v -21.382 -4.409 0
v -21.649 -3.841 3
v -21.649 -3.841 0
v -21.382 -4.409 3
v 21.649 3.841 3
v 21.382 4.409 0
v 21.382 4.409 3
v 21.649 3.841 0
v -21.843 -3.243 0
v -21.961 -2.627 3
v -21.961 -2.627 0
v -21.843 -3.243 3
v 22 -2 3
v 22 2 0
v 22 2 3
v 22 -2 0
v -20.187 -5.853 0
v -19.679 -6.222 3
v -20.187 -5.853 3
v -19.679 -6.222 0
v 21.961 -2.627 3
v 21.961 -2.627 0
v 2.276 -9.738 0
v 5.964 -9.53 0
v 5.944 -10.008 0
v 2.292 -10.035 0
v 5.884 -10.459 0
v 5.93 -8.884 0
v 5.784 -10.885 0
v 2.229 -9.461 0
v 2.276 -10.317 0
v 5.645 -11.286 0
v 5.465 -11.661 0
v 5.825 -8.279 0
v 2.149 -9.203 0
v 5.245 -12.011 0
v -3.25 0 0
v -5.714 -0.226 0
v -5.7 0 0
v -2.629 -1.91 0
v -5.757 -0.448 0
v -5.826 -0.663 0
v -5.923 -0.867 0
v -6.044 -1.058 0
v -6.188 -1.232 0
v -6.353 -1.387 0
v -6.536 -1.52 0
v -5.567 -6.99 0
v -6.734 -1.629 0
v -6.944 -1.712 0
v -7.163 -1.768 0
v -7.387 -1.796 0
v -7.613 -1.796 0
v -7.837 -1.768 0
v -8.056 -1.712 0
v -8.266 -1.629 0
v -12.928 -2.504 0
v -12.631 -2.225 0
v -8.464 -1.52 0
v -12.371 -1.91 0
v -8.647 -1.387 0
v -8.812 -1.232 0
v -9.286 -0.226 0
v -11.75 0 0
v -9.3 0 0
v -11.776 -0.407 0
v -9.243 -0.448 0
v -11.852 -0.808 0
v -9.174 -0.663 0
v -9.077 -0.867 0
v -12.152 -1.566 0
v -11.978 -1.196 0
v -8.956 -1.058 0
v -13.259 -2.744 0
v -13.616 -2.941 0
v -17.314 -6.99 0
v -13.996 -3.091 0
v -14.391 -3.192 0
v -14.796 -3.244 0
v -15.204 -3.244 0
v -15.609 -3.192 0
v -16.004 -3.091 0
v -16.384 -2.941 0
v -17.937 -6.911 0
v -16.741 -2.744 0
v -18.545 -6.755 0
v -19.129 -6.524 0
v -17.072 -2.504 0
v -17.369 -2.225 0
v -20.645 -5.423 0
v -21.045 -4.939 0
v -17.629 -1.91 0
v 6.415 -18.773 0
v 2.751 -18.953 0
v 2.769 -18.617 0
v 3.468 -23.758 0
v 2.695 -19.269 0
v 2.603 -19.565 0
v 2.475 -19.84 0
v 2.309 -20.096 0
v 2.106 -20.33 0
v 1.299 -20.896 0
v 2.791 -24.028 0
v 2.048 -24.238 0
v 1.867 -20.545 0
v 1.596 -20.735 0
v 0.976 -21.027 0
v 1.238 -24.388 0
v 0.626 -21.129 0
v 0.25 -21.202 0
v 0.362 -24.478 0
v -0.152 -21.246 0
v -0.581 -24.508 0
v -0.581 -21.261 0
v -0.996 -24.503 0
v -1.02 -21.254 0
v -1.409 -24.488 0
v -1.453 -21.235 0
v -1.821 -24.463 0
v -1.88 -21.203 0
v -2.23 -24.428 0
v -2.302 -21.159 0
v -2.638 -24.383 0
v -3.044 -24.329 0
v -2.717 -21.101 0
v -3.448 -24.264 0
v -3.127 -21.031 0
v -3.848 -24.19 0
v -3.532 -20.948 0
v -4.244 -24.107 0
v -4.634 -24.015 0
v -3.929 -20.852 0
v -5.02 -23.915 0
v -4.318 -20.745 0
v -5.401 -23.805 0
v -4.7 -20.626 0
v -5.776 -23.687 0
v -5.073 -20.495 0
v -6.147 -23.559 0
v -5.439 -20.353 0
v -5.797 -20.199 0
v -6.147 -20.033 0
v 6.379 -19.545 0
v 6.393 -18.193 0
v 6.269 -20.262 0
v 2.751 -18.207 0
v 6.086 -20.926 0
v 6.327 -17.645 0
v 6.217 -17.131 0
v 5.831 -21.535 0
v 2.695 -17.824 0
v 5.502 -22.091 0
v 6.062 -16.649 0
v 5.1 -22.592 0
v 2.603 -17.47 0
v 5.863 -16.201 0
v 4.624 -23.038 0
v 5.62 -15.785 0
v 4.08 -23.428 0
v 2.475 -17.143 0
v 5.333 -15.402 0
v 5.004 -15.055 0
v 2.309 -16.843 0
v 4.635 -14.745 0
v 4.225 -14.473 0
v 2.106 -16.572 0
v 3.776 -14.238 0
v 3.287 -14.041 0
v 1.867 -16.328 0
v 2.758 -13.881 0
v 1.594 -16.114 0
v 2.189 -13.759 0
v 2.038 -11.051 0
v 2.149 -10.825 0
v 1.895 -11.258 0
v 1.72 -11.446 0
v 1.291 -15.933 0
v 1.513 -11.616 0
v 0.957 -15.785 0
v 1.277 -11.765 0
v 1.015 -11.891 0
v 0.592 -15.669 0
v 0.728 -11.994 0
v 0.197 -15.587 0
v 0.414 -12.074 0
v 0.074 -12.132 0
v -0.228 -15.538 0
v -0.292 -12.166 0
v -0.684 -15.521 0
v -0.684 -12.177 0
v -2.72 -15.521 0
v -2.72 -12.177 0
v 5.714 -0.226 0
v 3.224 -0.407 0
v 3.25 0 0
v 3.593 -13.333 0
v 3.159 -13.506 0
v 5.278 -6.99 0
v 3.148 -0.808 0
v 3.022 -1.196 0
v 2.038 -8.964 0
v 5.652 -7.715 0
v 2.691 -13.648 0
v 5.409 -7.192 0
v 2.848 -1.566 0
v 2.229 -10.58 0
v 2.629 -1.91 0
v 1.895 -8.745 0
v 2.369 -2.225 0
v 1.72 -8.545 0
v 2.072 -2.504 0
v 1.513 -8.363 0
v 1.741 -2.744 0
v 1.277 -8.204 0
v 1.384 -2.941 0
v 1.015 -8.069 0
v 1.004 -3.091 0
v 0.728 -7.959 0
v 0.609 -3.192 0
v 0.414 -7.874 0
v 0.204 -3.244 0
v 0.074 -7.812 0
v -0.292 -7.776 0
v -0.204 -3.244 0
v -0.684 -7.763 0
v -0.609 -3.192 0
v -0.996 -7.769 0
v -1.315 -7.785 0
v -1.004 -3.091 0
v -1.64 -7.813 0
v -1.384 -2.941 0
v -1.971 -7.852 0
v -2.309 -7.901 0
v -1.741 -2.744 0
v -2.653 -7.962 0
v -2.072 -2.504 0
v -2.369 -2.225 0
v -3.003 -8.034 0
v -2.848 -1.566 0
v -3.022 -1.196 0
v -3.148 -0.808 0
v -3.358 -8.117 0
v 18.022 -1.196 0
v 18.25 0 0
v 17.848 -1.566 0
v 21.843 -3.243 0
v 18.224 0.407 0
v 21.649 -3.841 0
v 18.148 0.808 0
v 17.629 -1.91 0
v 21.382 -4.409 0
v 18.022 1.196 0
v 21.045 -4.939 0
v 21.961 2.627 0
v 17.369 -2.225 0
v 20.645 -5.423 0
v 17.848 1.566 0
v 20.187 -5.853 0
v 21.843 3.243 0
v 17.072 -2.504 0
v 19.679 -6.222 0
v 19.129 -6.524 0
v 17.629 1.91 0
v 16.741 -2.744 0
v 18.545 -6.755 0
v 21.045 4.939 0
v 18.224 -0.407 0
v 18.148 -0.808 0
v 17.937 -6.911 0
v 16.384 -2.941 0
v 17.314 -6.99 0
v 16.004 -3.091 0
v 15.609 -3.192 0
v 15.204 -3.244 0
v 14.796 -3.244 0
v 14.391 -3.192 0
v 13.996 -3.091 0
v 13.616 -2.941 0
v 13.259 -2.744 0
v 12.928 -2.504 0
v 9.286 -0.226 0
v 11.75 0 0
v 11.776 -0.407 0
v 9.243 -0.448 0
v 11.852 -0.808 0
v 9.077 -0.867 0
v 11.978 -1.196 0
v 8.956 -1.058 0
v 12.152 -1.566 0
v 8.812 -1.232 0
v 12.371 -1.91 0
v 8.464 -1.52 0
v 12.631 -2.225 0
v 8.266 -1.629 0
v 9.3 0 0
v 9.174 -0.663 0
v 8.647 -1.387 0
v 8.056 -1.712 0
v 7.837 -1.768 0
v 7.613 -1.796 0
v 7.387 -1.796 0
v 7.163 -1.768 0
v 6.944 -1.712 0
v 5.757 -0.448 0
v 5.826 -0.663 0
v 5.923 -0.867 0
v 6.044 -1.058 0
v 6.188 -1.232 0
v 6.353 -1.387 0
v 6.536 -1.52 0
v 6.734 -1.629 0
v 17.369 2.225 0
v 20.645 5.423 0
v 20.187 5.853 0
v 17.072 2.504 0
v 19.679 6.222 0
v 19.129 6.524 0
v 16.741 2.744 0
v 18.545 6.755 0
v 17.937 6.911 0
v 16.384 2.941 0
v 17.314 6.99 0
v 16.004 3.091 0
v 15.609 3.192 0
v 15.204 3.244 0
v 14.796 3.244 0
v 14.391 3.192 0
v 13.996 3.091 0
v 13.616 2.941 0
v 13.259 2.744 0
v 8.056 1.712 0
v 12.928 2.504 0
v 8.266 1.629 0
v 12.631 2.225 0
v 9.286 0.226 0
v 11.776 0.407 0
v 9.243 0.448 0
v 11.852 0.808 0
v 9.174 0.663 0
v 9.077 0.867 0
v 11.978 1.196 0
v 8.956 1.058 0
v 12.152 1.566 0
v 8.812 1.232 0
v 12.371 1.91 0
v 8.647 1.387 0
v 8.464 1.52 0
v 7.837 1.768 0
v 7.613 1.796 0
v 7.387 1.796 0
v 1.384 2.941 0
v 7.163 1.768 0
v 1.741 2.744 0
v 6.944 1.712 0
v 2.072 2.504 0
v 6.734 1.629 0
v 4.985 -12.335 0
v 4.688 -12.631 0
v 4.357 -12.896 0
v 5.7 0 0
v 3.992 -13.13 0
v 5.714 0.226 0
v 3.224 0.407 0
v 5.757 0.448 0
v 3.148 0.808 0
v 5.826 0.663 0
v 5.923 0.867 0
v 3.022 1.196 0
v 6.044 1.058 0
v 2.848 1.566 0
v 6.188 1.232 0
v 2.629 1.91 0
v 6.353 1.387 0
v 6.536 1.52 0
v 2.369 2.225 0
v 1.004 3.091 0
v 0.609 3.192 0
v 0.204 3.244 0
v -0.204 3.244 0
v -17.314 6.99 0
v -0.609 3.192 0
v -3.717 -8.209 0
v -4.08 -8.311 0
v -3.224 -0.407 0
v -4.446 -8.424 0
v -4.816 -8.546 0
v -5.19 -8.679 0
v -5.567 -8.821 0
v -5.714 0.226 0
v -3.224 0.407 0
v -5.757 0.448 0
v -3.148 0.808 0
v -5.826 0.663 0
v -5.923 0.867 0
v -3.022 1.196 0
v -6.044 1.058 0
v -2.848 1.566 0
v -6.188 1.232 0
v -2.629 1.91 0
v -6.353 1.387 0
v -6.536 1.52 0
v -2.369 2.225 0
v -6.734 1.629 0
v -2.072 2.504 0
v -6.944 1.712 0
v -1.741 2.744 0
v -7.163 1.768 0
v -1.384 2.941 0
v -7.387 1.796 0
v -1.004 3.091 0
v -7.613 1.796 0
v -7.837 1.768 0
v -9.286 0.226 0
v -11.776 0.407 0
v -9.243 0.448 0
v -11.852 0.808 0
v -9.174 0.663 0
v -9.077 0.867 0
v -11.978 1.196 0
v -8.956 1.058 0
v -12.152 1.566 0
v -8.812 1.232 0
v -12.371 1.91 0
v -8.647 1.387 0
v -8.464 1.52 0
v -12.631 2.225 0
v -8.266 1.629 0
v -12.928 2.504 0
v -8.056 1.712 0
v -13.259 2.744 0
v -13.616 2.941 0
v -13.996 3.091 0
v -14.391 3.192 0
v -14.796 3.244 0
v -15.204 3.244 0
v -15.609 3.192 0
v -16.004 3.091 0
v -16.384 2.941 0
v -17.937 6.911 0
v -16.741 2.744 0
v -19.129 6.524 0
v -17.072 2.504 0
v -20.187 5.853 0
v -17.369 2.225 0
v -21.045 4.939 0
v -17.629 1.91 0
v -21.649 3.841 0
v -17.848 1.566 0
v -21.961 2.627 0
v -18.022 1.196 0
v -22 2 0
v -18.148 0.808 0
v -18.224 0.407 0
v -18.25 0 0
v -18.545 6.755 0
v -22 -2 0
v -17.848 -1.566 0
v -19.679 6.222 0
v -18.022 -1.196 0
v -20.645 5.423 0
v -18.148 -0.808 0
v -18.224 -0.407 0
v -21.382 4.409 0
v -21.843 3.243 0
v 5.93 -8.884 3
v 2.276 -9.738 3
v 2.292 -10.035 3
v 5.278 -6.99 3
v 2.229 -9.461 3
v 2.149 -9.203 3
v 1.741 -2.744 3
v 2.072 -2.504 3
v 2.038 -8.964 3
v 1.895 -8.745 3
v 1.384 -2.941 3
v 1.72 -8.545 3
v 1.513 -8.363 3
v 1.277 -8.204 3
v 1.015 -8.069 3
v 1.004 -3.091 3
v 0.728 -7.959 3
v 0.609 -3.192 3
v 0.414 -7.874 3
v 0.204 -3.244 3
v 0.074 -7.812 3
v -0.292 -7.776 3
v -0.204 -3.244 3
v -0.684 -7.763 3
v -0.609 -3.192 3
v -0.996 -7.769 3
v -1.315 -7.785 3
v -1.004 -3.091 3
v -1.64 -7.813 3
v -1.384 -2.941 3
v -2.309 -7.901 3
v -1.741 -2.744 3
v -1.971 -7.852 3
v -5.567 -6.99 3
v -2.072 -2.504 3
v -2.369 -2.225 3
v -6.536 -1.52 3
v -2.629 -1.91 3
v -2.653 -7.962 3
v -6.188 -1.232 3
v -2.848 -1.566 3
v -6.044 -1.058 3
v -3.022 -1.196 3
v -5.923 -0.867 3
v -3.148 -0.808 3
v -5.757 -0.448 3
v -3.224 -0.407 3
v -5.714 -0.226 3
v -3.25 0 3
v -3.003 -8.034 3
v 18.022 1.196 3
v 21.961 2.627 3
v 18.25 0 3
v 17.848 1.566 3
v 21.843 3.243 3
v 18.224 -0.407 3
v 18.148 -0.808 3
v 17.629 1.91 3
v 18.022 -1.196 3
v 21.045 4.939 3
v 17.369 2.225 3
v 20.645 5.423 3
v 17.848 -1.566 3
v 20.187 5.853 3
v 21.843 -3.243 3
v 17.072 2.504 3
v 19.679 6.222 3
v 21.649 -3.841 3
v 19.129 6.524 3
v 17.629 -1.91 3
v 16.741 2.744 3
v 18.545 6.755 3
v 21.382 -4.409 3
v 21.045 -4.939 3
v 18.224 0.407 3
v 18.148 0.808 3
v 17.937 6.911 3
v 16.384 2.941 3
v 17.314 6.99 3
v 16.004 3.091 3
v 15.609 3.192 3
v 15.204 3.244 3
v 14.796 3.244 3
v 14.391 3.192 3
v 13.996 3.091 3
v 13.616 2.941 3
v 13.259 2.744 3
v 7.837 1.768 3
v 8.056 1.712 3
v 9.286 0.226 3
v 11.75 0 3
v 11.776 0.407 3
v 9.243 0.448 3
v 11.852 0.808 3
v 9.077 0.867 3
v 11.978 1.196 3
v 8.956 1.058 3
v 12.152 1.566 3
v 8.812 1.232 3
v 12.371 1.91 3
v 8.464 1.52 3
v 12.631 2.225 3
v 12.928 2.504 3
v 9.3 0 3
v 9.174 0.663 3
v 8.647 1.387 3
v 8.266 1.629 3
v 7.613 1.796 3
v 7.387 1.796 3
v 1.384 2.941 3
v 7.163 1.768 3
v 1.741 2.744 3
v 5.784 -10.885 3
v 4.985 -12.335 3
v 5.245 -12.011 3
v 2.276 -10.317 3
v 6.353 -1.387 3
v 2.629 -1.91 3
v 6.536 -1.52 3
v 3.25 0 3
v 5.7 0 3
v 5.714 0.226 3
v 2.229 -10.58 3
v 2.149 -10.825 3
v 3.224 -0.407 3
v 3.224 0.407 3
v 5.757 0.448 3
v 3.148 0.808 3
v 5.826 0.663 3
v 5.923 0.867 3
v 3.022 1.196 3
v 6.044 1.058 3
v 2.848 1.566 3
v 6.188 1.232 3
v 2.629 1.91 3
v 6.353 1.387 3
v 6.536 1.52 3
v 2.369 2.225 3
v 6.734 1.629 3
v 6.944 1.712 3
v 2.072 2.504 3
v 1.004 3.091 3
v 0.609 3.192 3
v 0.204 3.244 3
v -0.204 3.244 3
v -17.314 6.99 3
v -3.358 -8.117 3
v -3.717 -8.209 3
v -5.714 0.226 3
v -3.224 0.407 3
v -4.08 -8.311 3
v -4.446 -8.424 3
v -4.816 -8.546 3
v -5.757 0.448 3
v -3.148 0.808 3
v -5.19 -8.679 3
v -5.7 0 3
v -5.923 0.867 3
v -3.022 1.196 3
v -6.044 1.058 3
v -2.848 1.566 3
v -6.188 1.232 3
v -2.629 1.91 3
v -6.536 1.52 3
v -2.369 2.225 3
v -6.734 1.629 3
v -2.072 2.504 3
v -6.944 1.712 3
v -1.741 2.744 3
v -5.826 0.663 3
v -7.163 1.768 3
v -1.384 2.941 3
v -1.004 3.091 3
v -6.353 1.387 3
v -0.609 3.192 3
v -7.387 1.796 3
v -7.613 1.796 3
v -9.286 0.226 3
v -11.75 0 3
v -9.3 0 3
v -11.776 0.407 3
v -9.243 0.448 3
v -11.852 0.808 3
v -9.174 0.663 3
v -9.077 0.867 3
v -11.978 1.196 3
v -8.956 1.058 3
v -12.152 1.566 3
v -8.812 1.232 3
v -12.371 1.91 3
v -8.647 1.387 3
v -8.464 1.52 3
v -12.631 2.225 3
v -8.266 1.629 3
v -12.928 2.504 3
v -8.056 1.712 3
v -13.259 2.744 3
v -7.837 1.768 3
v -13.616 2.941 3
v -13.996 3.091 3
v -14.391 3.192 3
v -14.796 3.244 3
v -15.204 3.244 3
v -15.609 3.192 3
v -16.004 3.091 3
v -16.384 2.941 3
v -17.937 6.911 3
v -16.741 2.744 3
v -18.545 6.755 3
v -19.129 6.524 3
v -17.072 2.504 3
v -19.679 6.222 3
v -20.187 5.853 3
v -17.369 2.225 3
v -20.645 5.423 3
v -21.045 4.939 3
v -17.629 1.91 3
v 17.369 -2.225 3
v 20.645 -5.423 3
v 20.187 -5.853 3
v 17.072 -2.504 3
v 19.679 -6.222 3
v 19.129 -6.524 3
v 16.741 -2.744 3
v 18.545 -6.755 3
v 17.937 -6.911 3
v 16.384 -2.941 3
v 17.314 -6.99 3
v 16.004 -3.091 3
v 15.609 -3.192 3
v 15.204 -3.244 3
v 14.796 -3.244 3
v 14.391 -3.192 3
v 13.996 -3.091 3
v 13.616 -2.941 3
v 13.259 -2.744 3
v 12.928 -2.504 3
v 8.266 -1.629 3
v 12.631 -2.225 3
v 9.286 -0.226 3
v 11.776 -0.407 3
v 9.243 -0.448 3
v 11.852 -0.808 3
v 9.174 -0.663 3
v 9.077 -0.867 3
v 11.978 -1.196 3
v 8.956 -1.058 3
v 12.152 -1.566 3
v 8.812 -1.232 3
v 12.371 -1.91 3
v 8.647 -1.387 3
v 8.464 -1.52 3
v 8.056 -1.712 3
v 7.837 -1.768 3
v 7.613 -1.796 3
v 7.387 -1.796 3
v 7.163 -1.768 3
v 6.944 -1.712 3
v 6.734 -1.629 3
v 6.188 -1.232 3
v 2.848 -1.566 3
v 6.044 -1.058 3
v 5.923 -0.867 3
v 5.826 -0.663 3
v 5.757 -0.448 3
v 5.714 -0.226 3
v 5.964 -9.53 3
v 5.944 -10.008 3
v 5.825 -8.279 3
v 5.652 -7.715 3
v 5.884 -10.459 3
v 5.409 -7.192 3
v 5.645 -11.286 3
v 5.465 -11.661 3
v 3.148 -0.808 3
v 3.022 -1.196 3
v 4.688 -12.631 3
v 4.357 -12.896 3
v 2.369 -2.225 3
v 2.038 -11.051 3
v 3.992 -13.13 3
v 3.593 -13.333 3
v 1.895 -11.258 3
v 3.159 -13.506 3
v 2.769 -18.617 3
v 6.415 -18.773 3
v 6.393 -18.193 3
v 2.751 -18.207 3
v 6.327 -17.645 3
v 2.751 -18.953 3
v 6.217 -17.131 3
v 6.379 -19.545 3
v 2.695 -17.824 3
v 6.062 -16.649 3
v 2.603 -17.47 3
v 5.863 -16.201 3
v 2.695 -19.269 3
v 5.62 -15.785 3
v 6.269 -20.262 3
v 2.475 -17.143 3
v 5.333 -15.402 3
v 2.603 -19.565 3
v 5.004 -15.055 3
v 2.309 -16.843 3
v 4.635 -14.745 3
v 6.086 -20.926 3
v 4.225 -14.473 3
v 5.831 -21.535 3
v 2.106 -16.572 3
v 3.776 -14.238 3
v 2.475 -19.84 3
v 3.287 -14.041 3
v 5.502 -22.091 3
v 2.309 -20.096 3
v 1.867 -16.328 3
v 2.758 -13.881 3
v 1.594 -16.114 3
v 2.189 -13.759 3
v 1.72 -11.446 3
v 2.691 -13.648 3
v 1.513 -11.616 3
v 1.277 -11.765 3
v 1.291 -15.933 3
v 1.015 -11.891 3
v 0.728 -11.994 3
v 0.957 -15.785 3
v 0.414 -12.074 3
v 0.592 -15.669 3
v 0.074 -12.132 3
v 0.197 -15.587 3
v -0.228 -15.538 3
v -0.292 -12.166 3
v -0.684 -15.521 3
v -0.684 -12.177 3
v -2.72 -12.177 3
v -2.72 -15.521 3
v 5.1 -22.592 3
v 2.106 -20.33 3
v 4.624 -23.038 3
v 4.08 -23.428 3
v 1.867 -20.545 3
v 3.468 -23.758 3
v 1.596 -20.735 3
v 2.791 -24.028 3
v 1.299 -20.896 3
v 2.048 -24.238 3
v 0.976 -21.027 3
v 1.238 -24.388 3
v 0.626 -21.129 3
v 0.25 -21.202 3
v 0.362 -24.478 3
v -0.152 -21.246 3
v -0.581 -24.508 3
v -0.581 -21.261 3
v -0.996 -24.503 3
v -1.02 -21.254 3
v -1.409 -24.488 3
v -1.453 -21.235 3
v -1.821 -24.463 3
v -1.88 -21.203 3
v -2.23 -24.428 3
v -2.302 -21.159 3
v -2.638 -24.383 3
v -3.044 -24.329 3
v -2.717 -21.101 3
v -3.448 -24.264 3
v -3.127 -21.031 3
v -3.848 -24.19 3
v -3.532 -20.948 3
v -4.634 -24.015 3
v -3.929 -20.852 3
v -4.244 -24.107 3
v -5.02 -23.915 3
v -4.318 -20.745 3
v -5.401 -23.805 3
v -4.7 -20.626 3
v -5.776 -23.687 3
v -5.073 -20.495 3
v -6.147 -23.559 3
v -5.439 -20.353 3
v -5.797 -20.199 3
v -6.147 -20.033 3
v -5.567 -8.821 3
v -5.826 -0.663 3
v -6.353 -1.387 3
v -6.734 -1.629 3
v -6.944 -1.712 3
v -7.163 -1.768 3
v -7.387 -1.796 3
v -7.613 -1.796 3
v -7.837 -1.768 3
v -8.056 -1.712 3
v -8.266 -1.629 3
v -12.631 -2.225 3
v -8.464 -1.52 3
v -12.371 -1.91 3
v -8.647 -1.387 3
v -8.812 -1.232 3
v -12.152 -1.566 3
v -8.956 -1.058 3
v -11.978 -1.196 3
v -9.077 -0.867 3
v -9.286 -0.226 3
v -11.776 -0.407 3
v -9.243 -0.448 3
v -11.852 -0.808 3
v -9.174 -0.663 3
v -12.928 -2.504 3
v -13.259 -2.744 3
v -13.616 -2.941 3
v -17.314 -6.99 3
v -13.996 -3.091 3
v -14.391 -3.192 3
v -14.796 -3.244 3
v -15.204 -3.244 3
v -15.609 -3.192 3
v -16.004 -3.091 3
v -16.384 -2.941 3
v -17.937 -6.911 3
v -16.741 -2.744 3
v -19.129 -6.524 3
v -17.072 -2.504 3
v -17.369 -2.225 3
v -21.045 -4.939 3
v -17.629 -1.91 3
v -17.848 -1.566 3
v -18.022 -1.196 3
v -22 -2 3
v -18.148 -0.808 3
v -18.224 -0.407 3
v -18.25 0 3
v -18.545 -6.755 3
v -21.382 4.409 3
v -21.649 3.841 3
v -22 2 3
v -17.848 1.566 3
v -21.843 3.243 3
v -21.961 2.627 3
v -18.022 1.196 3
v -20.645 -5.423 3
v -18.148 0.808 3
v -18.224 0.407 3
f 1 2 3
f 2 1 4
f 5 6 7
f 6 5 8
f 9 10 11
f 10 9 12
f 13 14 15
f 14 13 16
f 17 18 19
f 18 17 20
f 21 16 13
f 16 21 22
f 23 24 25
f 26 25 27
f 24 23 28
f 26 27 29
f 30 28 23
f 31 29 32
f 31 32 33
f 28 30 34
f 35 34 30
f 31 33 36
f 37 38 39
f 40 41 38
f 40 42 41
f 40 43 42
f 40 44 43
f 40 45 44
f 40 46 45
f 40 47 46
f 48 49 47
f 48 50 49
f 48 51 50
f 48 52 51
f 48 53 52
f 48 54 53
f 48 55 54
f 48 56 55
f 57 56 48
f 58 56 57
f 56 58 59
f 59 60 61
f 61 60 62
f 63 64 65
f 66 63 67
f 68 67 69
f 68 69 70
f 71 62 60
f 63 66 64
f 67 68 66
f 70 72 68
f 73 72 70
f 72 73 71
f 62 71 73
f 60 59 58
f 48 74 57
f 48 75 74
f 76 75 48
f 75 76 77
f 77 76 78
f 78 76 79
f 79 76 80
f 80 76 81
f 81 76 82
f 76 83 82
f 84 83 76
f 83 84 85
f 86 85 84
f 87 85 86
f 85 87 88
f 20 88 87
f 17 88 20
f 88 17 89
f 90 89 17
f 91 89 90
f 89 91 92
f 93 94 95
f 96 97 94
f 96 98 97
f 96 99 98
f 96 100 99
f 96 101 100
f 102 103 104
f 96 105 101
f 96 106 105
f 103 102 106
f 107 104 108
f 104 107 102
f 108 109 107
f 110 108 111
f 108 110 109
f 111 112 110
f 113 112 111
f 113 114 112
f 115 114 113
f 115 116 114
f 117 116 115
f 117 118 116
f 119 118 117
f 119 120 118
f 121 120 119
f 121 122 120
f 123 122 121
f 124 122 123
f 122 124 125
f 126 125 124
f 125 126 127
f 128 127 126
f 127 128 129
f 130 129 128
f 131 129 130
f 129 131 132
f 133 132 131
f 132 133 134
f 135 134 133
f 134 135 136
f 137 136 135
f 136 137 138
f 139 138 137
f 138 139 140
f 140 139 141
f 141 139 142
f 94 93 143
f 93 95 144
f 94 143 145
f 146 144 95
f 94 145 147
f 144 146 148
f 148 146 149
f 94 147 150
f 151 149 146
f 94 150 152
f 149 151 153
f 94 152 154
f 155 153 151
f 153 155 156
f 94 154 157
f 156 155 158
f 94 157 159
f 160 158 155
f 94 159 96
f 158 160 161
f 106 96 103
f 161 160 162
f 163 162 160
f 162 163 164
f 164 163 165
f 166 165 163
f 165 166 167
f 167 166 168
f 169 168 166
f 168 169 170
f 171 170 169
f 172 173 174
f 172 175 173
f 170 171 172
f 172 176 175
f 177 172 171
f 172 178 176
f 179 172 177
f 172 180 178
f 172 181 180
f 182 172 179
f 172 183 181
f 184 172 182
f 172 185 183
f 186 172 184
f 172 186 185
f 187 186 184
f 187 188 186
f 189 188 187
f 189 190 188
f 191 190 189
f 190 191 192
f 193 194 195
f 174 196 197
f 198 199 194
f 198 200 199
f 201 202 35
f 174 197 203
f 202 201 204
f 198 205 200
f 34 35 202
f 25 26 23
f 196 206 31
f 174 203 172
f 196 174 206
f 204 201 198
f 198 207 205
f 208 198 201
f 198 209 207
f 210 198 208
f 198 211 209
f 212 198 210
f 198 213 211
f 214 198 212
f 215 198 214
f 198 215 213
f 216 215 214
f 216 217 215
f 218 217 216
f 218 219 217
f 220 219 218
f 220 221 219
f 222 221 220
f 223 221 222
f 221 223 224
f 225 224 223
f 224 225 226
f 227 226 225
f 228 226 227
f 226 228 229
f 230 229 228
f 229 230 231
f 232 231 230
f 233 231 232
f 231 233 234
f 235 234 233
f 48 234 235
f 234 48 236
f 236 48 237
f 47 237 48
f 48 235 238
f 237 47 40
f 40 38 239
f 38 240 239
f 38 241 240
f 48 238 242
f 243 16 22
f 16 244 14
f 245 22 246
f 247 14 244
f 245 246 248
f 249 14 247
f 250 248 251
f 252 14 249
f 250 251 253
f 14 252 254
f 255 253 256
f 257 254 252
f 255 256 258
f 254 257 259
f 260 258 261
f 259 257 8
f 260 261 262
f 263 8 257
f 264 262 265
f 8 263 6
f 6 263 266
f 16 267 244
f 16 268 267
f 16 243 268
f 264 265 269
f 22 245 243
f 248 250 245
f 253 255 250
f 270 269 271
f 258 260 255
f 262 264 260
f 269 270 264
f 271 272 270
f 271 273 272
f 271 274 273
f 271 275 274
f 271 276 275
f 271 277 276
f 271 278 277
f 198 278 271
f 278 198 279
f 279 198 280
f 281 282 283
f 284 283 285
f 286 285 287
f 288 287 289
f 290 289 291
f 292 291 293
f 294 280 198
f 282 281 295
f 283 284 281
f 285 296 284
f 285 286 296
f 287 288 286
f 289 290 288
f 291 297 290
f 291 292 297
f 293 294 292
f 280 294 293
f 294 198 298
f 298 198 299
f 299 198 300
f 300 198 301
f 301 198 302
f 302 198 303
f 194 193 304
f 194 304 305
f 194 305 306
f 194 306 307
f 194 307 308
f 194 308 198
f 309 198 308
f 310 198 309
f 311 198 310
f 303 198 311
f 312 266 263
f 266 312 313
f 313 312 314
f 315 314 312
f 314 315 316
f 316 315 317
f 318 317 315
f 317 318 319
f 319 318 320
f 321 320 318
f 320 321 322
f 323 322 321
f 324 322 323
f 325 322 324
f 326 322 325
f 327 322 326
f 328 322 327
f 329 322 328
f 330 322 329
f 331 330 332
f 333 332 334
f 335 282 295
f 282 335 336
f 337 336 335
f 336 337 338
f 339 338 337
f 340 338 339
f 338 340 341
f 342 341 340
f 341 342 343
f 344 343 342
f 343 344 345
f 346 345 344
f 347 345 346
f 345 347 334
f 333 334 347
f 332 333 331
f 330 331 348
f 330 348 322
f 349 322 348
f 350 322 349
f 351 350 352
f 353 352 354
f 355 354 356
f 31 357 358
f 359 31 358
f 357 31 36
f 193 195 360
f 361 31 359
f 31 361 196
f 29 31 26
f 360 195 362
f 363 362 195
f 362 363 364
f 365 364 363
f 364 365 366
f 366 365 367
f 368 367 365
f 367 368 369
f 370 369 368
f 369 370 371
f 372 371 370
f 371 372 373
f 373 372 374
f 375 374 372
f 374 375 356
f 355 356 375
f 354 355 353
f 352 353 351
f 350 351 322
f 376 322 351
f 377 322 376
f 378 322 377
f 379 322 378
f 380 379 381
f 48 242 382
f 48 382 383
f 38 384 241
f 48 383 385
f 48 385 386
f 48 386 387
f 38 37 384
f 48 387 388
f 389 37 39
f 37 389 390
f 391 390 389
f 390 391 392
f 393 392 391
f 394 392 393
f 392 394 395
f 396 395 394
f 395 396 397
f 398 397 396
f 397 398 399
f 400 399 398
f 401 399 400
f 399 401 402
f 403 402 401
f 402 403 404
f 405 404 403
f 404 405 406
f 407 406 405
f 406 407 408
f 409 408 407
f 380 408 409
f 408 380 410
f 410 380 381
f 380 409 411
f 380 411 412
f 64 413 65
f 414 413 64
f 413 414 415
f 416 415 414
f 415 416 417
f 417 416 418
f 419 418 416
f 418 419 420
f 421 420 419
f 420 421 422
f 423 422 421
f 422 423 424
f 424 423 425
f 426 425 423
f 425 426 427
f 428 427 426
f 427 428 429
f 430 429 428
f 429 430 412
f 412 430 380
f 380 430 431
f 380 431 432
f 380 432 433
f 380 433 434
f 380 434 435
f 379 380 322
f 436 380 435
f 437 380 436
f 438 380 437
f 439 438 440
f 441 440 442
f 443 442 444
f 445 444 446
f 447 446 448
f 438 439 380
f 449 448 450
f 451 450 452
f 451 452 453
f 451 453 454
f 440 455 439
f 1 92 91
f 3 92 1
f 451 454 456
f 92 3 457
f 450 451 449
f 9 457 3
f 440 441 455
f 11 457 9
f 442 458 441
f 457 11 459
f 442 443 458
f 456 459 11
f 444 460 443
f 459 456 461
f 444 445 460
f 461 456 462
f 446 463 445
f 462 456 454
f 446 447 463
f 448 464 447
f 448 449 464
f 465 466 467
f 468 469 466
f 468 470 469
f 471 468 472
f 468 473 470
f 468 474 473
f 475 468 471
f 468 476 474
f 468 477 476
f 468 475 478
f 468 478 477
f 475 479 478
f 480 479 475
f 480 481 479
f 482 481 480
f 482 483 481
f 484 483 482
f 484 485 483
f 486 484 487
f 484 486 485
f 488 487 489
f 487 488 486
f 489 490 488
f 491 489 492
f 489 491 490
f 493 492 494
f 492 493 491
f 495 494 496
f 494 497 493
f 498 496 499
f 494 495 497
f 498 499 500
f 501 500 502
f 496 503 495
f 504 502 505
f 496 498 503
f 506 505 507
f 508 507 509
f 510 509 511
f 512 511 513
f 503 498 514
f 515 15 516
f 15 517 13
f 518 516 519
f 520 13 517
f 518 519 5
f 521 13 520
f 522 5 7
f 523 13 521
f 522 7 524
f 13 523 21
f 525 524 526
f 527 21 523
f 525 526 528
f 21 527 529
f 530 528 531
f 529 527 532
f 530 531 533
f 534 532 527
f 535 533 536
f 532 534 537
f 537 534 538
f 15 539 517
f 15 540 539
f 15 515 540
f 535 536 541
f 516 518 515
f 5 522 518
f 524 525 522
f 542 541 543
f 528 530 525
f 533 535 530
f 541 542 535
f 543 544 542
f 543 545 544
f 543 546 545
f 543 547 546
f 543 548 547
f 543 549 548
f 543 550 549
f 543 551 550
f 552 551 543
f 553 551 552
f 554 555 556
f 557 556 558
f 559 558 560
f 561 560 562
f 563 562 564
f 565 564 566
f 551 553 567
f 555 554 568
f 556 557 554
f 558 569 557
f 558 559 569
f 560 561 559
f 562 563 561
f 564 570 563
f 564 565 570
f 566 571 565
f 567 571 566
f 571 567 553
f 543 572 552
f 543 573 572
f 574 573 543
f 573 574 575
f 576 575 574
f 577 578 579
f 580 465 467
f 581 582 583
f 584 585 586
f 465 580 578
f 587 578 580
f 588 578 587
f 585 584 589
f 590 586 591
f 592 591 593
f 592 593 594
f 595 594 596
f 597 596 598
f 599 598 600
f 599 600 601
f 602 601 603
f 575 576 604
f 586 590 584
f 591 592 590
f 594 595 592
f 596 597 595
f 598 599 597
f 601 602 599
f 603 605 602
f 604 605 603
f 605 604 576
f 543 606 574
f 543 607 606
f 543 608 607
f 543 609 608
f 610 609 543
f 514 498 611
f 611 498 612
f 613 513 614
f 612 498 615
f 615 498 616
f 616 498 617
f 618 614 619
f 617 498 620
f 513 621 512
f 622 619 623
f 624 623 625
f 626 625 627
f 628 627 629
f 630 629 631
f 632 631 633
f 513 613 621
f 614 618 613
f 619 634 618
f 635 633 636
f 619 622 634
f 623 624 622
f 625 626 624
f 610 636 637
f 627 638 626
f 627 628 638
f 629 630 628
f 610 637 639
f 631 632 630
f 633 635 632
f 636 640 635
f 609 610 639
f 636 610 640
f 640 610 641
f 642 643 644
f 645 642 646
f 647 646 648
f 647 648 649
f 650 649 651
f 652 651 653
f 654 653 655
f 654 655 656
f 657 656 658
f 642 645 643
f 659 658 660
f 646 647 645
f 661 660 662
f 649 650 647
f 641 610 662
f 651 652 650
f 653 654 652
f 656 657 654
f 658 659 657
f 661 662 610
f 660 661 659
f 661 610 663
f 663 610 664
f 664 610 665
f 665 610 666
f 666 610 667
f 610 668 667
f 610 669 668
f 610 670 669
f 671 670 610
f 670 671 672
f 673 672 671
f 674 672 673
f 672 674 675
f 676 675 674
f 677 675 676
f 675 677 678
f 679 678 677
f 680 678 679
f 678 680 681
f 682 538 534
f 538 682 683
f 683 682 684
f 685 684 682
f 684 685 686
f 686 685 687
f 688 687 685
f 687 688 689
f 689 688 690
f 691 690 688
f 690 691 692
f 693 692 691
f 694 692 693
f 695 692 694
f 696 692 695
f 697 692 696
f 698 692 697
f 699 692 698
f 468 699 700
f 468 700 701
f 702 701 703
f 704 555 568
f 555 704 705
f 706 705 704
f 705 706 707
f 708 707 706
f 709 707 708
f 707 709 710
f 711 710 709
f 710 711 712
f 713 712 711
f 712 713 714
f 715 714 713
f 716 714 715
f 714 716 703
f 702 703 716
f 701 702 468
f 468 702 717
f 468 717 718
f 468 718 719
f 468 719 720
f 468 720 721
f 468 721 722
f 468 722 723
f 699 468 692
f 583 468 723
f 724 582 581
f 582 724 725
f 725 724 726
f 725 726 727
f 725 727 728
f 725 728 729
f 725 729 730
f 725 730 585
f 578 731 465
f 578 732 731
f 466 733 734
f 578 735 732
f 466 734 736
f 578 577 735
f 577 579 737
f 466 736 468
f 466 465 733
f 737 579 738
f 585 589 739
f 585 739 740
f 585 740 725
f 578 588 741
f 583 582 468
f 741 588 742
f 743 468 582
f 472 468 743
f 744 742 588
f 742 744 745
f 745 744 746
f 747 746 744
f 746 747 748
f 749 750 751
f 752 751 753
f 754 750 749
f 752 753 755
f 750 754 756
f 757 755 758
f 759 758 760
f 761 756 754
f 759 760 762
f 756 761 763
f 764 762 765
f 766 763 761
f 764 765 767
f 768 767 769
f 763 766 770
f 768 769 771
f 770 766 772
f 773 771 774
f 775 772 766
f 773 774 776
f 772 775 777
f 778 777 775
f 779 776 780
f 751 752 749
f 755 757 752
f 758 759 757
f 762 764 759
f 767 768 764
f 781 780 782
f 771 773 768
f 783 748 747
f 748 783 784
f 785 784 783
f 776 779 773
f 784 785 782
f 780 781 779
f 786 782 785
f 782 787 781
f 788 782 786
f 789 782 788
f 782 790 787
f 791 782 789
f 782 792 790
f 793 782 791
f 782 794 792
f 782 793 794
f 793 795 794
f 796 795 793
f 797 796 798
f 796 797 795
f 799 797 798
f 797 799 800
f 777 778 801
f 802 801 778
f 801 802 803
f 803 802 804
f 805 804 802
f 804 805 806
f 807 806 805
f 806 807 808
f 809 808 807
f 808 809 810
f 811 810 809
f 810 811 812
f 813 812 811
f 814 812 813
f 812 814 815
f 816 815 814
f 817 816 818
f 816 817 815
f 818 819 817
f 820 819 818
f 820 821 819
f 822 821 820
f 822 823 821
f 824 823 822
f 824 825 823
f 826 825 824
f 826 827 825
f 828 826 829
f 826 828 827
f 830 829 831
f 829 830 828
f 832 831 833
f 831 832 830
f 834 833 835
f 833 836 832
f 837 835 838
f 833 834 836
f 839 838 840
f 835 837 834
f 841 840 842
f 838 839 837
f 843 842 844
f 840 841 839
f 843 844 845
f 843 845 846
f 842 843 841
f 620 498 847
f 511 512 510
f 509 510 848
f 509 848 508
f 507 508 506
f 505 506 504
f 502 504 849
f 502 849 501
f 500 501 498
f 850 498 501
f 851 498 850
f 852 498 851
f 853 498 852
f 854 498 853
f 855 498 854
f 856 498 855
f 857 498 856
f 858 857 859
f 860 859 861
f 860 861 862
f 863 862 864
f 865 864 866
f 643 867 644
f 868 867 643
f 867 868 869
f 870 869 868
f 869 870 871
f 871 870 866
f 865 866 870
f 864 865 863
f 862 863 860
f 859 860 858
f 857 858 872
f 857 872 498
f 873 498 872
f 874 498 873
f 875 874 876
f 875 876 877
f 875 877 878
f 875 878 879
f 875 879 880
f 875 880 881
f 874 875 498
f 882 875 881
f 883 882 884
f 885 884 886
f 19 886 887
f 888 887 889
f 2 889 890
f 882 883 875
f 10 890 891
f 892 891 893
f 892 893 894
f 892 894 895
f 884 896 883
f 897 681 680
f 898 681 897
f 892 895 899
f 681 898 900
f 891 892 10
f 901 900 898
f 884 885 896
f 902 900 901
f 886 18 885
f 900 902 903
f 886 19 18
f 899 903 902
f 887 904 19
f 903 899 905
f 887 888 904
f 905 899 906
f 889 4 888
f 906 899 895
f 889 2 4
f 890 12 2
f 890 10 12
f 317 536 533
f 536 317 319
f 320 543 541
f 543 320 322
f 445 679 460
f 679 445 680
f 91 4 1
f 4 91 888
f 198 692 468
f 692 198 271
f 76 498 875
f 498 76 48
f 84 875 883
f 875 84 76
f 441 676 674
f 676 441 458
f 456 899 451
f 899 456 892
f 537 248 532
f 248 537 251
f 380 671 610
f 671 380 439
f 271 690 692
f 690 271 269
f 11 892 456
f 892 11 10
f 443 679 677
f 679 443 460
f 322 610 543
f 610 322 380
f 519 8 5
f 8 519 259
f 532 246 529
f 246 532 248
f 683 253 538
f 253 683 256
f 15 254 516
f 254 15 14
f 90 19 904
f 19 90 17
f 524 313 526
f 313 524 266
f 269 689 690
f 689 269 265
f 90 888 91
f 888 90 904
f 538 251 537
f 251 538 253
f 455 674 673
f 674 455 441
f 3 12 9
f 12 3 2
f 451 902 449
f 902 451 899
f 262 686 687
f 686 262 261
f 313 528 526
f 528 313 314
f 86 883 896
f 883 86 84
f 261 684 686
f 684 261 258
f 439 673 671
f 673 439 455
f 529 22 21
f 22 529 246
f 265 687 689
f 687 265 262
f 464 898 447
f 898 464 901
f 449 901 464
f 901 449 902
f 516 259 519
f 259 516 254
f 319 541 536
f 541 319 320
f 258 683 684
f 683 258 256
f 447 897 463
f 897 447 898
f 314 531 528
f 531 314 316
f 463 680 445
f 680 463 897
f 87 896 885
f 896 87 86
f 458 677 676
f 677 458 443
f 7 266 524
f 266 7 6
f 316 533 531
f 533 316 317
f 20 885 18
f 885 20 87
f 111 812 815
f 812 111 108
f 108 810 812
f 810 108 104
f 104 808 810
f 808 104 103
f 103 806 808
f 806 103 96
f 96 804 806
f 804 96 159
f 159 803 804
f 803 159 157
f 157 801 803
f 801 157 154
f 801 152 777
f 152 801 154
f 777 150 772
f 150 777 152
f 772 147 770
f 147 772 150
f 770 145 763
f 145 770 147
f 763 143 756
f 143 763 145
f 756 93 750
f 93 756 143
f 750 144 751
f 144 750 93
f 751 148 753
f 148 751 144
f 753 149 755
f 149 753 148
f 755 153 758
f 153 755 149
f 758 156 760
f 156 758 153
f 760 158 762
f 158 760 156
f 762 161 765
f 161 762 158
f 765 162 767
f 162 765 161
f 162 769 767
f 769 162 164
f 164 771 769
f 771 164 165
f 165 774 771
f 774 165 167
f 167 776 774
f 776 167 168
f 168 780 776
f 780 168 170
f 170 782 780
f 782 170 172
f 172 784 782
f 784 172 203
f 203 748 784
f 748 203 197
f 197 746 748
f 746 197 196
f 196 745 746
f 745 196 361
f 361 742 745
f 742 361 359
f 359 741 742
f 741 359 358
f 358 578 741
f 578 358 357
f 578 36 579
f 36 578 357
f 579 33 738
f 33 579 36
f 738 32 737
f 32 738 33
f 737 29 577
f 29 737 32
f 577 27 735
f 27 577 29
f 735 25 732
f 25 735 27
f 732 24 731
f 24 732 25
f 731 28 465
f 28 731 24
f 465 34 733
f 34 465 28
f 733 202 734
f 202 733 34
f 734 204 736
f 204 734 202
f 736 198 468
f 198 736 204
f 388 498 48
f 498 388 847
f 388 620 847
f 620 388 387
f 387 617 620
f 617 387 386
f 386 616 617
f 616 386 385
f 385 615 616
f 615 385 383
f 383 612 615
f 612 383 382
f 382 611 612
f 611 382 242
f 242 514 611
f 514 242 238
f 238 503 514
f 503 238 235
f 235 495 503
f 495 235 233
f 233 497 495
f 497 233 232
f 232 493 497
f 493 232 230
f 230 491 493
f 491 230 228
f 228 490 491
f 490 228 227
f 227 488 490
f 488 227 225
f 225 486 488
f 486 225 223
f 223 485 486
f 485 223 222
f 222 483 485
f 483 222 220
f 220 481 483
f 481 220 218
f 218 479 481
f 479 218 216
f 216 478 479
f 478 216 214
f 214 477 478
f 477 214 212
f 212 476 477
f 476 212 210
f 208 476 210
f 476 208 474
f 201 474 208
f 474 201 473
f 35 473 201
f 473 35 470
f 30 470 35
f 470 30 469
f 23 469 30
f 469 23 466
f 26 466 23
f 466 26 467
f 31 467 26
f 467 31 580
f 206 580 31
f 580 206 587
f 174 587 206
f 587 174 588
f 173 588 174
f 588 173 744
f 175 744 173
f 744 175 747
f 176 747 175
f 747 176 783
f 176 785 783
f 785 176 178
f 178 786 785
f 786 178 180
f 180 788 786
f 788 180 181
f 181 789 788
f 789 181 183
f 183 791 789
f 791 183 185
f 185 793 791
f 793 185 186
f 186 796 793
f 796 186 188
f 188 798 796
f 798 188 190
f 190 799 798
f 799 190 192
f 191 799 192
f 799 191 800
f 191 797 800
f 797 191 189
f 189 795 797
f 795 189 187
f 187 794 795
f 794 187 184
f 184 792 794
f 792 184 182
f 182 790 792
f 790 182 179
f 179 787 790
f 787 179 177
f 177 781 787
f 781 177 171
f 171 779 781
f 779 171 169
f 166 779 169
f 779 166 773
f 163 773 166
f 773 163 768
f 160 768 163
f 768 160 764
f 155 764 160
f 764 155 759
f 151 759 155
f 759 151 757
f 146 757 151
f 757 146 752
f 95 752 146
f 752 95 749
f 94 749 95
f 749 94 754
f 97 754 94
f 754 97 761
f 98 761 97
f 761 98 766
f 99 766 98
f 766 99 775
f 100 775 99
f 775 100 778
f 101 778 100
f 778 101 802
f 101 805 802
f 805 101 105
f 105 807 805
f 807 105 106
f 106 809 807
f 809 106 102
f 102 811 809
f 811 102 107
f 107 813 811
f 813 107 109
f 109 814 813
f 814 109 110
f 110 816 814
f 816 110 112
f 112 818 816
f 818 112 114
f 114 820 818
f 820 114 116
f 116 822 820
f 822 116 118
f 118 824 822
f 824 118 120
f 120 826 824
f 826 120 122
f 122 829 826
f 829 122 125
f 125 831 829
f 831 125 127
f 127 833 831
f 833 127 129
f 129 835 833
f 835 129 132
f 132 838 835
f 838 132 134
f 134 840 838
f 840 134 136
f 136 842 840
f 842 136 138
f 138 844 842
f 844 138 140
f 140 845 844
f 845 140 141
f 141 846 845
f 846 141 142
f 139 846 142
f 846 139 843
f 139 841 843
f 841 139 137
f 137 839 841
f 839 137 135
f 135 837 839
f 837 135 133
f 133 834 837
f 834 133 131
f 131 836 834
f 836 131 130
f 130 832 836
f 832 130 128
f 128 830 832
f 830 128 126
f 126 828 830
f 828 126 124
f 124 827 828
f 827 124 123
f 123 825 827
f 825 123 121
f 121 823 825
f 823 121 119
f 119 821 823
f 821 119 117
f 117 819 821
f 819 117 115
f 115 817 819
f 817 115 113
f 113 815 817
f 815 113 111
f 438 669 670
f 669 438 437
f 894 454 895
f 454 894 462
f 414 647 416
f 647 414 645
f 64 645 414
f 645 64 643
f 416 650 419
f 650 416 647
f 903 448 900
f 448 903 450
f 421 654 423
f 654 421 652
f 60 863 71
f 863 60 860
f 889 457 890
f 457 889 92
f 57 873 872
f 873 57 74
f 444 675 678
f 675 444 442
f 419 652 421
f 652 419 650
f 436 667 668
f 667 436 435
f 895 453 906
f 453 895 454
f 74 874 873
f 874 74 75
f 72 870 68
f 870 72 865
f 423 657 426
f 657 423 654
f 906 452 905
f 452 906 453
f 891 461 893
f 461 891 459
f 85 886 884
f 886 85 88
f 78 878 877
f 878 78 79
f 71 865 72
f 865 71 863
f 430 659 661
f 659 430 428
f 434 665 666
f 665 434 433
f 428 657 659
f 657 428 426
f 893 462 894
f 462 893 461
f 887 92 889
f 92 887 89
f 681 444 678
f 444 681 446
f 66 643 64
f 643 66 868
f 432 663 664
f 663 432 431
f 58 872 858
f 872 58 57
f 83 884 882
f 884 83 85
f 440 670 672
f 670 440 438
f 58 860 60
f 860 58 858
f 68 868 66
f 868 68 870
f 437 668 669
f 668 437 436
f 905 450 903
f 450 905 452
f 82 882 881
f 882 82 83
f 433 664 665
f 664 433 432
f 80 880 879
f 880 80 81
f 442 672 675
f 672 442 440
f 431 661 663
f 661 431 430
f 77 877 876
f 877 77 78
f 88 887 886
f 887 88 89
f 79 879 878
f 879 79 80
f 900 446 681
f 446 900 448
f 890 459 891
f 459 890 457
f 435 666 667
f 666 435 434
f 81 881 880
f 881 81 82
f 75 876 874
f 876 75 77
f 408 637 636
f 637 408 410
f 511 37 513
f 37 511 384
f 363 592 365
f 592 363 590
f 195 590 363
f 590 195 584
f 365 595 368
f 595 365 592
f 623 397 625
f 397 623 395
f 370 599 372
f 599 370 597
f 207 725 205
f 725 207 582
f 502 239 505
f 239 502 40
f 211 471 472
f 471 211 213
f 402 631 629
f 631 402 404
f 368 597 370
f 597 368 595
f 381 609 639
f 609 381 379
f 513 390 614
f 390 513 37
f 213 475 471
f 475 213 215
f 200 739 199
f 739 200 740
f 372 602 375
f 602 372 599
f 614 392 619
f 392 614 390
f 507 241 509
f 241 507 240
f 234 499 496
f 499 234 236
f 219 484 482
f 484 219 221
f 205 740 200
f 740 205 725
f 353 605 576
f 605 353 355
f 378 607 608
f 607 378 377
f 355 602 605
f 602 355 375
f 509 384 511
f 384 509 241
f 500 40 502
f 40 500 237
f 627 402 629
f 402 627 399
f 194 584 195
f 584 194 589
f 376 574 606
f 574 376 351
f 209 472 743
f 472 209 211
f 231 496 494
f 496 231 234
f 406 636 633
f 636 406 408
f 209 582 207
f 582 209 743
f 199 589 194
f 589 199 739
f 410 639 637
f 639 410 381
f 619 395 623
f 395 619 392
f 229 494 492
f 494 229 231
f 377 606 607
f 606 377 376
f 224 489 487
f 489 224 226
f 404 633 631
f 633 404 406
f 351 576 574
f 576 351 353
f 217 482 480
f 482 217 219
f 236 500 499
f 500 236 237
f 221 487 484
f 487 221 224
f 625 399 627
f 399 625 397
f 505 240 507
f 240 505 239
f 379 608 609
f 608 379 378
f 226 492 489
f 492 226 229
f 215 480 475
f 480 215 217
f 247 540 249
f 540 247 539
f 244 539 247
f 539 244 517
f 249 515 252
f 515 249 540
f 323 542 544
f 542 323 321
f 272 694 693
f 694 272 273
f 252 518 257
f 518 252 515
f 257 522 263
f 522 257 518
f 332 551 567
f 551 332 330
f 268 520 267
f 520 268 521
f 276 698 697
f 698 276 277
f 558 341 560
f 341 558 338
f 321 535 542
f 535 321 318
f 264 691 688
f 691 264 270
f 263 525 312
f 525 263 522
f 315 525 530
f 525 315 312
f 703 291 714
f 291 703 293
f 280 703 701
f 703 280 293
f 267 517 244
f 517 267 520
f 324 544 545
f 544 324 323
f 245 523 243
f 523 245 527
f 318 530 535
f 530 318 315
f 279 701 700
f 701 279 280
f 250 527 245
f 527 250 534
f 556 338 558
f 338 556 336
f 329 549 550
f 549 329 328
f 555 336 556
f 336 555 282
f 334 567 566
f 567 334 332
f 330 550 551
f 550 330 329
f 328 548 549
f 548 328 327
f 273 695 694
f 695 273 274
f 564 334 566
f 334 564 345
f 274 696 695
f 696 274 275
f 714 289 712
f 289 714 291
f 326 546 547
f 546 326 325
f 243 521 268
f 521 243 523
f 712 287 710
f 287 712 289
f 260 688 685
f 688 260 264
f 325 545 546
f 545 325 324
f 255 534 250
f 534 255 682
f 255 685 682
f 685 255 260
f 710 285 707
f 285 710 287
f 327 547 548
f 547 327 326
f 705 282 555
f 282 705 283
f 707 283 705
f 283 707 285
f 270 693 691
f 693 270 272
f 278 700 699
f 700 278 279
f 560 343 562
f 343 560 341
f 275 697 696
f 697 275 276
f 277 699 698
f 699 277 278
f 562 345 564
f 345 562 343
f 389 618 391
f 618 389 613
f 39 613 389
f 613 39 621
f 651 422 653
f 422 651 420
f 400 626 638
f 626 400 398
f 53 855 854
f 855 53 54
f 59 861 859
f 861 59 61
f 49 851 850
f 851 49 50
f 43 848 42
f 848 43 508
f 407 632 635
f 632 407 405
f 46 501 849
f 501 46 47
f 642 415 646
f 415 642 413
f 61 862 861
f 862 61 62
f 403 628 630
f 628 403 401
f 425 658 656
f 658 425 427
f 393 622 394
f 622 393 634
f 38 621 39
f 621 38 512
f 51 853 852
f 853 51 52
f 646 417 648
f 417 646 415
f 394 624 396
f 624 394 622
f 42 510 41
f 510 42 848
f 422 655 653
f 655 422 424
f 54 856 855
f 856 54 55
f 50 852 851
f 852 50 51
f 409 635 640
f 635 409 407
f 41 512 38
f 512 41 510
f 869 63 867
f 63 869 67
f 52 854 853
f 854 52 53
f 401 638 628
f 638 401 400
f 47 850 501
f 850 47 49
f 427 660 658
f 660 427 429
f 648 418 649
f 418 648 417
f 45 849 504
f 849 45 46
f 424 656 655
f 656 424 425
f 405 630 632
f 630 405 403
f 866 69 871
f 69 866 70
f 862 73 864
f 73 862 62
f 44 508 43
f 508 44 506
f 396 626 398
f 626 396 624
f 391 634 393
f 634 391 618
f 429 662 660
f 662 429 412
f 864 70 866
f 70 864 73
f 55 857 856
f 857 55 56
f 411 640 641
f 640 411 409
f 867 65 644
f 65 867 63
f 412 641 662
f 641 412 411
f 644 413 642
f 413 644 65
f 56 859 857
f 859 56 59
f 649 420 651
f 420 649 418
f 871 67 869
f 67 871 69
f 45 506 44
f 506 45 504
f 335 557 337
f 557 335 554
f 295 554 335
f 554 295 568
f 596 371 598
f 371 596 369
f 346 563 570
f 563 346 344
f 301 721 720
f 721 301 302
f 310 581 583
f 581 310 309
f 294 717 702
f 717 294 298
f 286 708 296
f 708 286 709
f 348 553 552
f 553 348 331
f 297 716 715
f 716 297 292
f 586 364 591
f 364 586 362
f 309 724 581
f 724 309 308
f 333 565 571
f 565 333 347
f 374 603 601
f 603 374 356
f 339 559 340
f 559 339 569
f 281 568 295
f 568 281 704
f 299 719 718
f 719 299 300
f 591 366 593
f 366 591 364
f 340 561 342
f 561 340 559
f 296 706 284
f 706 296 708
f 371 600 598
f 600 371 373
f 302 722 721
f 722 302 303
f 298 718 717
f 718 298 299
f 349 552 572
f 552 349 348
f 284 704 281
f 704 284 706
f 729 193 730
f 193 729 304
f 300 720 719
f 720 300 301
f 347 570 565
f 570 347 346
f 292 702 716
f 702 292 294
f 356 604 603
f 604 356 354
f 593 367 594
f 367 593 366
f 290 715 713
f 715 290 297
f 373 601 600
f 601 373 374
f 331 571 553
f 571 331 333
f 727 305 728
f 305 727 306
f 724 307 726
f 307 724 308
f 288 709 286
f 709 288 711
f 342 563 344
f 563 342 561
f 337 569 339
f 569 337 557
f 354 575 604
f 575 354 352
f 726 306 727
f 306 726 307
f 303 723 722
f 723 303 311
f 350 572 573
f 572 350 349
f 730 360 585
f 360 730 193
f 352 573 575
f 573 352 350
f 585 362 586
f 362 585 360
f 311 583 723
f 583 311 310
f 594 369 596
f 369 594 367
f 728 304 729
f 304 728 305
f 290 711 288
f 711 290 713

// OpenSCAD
$fn = 50;


difference() {
	union() {
		hull() {
			translate(v = [-17.0000000000, 2.0000000000, 0]) {
				cylinder(h = 3, r = 5);
			}
			translate(v = [17.0000000000, 2.0000000000, 0]) {
				cylinder(h = 3, r = 5);
			}
			translate(v = [-17.0000000000, -2.0000000000, 0]) {
				cylinder(h = 3, r = 5);
			}
			translate(v = [17.0000000000, -2.0000000000, 0]) {
				cylinder(h = 3, r = 5);
			}
		}
		translate(v = [0, -5, 0]) {
			linear_extrude(height = 3) {
				text(font = "DejaVu Sans Mono:style=Bold", halign = "center", size = 19.0000000000, text = "3", valign = "top");
			}
		}
	}
	union() {
		translate(v = [-15.0000000000, 0.0000000000, 0]) {
			translate(v = [0, 0, -100]) {
				cylinder(h = 200, r = 3.2500000000);
			}
		}
		translate(v = [0, 0, -100]) {
			cylinder(h = 200, r = 3.2500000000);
		}
		translate(v = [15.0000000000, 0.0000000000, 0]) {
			translate(v = [0, 0, -100]) {
				cylinder(h = 200, r = 3.2500000000);
			}
		}
		translate(v = [-15.0000000000, 0.0000000000, 0]) {
			translate(v = [0, 0, -100]) {
				cylinder(h = 200, r = 1.8000000000);
			}
		}
		translate(v = [-7.5000000000, 0.0000000000, 0]) {
			translate(v = [0, 0, -100]) {
				cylinder(h = 200, r = 1.8000000000);
			}
		}
		translate(v = [0, 0, -100]) {
			cylinder(h = 200, r = 1.8000000000);
		}
		translate(v = [7.5000000000, 0.0000000000, 0]) {
			translate(v = [0, 0, -100]) {
				cylinder(h = 200, r = 1.8000000000);
			}
		}
		translate(v = [15.0000000000, 0.0000000000, 0]) {
			translate(v = [0, 0, -100]) {
				cylinder(h = 200, r = 1.8000000000);
			}
		}
	}
}
